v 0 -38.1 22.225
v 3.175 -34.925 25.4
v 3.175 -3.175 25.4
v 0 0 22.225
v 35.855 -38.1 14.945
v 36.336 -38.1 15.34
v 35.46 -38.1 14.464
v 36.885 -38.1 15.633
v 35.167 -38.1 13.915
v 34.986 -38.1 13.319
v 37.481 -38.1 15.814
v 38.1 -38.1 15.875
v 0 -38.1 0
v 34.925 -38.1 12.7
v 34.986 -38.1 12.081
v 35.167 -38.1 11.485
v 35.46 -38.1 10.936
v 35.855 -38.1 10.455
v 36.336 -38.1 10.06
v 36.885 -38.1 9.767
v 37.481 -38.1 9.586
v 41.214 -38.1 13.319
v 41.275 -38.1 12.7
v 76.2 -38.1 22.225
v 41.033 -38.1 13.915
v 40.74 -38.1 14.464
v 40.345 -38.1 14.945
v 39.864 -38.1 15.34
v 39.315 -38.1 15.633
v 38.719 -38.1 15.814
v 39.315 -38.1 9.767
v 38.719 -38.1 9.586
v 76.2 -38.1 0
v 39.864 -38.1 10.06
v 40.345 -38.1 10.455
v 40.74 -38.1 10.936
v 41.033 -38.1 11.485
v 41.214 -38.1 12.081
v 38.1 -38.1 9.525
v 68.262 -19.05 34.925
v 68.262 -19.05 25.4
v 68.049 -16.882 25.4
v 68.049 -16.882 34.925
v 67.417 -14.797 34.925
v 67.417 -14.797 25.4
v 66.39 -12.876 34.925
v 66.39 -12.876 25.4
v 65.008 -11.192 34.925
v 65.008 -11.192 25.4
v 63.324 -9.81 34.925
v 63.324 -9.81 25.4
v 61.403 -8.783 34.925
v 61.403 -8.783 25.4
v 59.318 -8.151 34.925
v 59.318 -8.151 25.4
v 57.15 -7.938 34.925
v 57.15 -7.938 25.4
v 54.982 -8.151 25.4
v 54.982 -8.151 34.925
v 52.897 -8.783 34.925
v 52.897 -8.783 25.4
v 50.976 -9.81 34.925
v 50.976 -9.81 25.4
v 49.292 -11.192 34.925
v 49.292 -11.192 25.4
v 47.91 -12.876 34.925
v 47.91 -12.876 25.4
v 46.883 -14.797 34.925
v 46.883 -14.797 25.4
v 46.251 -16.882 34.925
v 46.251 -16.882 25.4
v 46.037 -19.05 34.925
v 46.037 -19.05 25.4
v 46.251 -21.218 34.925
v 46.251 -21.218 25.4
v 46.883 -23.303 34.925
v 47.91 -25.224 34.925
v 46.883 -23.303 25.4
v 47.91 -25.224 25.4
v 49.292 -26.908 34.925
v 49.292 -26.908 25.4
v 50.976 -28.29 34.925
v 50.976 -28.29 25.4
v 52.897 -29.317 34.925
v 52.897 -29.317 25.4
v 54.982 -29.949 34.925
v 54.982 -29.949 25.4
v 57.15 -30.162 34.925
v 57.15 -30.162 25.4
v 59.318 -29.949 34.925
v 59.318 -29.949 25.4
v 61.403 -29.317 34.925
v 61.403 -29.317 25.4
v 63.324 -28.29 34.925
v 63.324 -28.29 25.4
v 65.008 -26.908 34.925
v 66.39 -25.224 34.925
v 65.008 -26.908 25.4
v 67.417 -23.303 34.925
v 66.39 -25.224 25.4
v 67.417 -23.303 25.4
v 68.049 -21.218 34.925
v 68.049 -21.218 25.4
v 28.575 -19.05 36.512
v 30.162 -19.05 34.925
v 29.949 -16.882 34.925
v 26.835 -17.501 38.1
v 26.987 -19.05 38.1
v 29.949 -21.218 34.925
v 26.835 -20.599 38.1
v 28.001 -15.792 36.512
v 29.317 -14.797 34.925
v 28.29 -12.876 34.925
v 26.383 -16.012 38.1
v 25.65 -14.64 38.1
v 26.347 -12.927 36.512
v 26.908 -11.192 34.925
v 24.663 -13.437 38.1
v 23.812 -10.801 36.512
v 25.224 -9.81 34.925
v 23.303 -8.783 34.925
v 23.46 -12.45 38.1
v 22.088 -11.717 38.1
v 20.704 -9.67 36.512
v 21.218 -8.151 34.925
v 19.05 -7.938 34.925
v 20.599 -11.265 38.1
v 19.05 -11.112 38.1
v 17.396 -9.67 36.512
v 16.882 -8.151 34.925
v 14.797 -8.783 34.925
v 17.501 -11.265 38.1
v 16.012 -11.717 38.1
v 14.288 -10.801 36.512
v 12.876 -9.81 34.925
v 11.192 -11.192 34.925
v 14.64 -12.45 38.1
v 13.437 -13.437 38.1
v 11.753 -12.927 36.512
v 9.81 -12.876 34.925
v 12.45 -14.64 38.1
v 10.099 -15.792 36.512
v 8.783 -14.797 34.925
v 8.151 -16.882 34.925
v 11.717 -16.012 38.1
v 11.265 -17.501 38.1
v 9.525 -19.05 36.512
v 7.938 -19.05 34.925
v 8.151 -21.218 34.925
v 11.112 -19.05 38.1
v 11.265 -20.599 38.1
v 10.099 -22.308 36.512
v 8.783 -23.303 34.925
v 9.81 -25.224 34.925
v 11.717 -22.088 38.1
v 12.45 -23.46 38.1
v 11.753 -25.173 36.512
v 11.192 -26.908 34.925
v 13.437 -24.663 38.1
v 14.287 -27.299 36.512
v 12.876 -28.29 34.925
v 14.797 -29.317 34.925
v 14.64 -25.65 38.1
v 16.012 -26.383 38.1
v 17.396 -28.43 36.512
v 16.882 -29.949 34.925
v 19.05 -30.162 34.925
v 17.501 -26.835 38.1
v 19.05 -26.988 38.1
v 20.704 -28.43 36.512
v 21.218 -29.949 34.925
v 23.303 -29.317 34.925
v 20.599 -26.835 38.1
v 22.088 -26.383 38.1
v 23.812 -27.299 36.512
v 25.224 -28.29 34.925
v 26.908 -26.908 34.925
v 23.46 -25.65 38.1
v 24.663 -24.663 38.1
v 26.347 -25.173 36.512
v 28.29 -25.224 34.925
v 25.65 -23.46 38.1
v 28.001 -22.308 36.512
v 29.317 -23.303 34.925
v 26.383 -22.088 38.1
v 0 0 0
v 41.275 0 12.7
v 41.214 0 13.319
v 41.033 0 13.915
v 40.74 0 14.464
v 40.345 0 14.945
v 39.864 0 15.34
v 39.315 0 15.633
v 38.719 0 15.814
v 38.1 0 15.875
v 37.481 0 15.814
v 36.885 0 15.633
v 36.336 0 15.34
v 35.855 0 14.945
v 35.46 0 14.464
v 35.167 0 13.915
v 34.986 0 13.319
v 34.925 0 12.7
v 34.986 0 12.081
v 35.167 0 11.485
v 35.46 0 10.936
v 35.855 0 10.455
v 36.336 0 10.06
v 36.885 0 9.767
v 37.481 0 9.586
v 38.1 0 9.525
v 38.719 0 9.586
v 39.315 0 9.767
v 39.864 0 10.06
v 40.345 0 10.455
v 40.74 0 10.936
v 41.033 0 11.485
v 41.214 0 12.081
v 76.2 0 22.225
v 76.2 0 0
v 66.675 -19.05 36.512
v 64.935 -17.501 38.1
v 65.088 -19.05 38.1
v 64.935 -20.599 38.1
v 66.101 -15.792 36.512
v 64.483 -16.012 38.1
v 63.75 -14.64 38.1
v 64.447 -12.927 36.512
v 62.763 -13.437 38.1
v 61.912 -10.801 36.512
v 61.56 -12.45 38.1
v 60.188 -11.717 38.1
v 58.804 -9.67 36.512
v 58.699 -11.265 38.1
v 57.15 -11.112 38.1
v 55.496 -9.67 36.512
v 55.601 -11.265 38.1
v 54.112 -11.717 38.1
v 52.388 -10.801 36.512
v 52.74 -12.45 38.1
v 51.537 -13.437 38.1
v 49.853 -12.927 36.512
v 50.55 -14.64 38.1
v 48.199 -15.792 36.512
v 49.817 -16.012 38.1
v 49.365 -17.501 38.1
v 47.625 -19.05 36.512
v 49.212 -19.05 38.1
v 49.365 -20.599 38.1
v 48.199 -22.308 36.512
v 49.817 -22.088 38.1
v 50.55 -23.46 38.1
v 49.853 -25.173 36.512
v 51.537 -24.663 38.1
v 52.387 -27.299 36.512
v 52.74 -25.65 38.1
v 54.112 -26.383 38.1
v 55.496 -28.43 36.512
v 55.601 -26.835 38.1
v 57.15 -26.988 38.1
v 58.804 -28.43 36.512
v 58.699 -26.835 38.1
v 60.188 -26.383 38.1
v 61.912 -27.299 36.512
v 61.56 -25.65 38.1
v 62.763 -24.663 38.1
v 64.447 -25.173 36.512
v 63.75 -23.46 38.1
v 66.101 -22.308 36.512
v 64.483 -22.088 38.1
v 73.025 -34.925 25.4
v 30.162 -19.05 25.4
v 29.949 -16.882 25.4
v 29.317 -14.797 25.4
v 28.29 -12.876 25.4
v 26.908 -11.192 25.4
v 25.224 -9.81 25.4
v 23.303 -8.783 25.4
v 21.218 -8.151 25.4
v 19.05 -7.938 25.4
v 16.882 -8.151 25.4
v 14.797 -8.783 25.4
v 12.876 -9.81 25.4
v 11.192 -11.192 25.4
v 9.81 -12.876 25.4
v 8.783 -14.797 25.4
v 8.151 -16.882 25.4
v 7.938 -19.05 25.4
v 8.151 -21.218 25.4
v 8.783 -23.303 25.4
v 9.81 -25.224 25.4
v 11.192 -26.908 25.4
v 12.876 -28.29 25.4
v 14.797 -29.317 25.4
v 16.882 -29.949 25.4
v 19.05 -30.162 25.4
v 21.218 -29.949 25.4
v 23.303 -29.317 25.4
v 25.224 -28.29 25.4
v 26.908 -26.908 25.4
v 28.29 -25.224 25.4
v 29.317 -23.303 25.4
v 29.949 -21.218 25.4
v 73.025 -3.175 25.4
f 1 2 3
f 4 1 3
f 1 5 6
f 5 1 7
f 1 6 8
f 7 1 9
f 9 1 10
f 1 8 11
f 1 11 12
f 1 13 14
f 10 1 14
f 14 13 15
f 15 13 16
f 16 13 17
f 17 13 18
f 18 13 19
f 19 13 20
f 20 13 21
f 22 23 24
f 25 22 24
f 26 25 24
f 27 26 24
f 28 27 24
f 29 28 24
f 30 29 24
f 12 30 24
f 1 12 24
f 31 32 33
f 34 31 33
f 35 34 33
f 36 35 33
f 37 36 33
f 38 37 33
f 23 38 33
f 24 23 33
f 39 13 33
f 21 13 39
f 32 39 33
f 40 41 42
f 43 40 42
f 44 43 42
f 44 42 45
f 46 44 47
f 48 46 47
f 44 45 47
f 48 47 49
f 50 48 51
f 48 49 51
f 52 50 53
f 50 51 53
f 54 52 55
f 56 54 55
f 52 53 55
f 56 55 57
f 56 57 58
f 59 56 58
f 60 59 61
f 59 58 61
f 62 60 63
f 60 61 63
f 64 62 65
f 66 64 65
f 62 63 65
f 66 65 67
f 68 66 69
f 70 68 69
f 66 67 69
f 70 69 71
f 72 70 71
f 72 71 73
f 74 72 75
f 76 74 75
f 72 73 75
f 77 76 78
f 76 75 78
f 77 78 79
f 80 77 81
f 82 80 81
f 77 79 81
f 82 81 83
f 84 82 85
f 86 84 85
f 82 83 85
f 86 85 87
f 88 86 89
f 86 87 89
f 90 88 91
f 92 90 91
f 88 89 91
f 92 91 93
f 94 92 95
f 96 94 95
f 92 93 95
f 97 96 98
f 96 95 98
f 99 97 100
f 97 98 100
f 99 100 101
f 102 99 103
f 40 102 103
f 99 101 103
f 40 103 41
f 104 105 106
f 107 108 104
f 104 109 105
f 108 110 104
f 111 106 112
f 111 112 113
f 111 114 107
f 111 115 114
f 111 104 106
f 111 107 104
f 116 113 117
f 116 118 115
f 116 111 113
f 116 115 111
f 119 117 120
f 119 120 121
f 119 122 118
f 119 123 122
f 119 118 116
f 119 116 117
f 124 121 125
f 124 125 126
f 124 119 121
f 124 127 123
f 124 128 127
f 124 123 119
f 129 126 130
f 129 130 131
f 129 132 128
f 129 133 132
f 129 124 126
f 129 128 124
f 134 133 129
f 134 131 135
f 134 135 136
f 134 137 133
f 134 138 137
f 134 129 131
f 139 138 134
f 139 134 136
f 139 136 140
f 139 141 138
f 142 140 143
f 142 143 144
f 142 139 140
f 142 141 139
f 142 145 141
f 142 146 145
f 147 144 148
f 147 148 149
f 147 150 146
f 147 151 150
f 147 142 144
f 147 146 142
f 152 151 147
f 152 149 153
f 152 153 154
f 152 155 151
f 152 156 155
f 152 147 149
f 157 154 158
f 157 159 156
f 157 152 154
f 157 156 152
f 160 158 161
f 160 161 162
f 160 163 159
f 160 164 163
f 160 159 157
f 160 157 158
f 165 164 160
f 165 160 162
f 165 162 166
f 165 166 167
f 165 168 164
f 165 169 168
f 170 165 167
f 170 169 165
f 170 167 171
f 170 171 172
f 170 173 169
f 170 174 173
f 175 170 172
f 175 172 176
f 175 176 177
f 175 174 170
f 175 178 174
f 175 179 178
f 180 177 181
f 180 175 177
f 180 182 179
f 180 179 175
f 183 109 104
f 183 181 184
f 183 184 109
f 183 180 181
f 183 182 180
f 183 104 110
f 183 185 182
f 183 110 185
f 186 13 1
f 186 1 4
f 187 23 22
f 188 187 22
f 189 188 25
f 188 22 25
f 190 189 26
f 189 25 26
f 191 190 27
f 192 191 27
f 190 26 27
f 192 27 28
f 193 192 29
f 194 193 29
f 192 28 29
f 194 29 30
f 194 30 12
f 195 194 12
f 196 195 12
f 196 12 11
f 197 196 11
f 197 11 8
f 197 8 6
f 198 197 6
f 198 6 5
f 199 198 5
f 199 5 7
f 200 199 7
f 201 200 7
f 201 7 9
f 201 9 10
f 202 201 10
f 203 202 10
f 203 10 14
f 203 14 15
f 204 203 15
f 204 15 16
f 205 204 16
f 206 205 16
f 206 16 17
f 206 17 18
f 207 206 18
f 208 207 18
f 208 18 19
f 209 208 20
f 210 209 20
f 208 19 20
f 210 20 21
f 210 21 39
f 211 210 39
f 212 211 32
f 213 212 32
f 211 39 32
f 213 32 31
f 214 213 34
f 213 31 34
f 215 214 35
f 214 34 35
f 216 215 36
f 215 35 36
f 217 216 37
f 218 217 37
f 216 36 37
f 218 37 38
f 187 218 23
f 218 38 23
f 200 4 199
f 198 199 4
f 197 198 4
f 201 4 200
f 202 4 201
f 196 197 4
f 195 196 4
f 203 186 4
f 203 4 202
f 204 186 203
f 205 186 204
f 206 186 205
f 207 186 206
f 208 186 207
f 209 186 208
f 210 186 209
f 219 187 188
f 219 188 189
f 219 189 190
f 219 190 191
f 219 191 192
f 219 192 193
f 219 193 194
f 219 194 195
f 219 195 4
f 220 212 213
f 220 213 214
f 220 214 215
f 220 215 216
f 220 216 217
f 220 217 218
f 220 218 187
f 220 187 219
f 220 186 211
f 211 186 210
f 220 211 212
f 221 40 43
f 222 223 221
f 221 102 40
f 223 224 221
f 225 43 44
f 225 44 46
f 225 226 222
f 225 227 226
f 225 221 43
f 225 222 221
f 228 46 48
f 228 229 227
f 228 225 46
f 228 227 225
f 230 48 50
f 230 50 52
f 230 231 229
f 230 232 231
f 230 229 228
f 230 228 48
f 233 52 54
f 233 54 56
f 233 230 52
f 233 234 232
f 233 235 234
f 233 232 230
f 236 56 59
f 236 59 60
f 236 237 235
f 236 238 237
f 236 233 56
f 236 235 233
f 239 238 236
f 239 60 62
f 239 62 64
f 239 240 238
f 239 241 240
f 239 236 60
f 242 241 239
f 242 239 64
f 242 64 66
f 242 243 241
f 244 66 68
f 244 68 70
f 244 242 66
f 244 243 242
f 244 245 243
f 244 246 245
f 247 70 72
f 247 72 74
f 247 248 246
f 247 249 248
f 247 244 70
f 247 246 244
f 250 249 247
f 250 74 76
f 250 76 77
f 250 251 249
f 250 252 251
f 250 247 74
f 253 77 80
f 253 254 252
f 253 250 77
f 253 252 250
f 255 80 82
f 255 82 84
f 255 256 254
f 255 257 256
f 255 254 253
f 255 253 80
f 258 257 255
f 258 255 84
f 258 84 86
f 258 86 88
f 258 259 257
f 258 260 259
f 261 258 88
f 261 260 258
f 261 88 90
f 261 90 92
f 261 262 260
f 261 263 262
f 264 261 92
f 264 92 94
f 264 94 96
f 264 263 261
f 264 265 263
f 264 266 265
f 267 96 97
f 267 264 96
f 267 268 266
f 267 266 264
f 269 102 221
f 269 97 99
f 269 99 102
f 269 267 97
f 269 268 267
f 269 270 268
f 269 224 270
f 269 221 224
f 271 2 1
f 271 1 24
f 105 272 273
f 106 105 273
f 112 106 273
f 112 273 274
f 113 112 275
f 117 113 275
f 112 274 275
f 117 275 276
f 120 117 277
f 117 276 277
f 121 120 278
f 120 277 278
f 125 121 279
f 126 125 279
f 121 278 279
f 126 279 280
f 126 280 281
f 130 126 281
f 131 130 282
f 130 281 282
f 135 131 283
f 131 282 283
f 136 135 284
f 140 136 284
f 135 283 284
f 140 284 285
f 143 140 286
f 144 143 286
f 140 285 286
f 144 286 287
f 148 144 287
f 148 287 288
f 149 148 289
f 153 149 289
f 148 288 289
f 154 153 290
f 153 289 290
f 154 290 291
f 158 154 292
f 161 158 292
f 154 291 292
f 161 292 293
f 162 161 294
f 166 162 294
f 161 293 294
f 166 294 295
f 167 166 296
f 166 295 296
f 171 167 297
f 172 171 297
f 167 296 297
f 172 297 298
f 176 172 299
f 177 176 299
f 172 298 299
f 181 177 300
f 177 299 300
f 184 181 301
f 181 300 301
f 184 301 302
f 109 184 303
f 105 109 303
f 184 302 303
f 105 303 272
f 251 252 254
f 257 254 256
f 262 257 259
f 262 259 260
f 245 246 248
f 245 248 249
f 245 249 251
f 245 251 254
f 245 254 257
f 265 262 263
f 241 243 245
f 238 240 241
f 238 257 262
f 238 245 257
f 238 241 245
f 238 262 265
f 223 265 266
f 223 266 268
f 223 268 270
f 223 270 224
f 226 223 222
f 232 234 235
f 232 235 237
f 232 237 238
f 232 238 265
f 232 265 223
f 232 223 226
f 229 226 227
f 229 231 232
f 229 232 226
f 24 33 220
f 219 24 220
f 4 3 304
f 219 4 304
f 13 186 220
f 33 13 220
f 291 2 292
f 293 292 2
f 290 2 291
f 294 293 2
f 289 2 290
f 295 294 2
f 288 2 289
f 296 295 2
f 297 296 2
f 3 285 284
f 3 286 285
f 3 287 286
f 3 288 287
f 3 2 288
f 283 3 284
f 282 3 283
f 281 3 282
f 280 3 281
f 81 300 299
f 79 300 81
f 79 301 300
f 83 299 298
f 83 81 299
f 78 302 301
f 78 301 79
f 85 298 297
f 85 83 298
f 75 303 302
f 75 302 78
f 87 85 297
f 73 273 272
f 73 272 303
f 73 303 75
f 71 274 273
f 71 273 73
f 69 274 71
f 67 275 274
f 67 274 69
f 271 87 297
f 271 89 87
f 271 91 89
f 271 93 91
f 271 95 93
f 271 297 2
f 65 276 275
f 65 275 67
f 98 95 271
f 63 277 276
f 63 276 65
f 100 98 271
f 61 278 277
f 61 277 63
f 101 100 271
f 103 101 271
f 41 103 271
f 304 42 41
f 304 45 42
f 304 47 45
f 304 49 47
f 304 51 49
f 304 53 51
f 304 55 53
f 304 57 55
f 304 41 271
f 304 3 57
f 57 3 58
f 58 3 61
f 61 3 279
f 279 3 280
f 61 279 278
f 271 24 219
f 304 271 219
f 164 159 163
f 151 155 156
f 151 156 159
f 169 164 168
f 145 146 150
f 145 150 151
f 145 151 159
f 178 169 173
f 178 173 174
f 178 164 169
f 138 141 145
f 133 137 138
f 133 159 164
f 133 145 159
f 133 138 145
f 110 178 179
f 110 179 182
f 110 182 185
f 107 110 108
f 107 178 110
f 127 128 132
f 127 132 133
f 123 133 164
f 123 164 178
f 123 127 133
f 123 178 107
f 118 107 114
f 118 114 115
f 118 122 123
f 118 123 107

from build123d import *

# Parameters (mm, degrees)
F0_W          = 76.2
F0_H          = 38.1
F1_DEPTH      = 25.4
F2_R          = 11.1125
F3_DEPTH      = 12.7
F4_R          = 3.175
F5_DEPTH      = 38.101
F5_DEPTH_BACK = 139
F6_SIZE       = 3.175


# Not quite as in the source:
# - an extrude ends at something that could not be found from the text; its depth is read off the source's solid


with BuildPart() as f1:
    # F0 (on Top) → F1 (new body)
    with BuildSketch(Plane.XY):
        with Locations((38.1, -19.05)):
            Rectangle(F0_W, F0_H)
    extrude(amount=F1_DEPTH)

    # F2 (on face) → F3 (join)
    with BuildSketch(Plane.XY.offset(25.4)):
        with Locations((19.05, -19.05)):
            Circle(F2_R)
        with Locations((57.15, -19.05)):
            Circle(F2_R)
    extrude(amount=F3_DEPTH)

    # F4 (on face) → F5 (cut, two sides)
    with BuildSketch(Plane.XZ.offset(38.1)) as f5_sk:
        with Locations((38.1, 12.7)):
            Circle(F4_R)
    extrude(amount=-F5_DEPTH, mode=Mode.SUBTRACT)
    extrude(f5_sk.sketch, amount=F5_DEPTH_BACK, mode=Mode.SUBTRACT)

    # F6
    f6_edges = [f1.edges().sort_by_distance(p)[0] for p in [
        (46.0375, -19.05, 38.1),
        (7.9375, -19.05, 38.1),
        (38.1, -38.1, 25.4),
        (76.2, -19.05, 25.4),
        (38.1, 0, 25.4),
        (0, -19.05, 25.4),
    ]]
    chamfer(f6_edges, length=F6_SIZE)


solid = f1.part
